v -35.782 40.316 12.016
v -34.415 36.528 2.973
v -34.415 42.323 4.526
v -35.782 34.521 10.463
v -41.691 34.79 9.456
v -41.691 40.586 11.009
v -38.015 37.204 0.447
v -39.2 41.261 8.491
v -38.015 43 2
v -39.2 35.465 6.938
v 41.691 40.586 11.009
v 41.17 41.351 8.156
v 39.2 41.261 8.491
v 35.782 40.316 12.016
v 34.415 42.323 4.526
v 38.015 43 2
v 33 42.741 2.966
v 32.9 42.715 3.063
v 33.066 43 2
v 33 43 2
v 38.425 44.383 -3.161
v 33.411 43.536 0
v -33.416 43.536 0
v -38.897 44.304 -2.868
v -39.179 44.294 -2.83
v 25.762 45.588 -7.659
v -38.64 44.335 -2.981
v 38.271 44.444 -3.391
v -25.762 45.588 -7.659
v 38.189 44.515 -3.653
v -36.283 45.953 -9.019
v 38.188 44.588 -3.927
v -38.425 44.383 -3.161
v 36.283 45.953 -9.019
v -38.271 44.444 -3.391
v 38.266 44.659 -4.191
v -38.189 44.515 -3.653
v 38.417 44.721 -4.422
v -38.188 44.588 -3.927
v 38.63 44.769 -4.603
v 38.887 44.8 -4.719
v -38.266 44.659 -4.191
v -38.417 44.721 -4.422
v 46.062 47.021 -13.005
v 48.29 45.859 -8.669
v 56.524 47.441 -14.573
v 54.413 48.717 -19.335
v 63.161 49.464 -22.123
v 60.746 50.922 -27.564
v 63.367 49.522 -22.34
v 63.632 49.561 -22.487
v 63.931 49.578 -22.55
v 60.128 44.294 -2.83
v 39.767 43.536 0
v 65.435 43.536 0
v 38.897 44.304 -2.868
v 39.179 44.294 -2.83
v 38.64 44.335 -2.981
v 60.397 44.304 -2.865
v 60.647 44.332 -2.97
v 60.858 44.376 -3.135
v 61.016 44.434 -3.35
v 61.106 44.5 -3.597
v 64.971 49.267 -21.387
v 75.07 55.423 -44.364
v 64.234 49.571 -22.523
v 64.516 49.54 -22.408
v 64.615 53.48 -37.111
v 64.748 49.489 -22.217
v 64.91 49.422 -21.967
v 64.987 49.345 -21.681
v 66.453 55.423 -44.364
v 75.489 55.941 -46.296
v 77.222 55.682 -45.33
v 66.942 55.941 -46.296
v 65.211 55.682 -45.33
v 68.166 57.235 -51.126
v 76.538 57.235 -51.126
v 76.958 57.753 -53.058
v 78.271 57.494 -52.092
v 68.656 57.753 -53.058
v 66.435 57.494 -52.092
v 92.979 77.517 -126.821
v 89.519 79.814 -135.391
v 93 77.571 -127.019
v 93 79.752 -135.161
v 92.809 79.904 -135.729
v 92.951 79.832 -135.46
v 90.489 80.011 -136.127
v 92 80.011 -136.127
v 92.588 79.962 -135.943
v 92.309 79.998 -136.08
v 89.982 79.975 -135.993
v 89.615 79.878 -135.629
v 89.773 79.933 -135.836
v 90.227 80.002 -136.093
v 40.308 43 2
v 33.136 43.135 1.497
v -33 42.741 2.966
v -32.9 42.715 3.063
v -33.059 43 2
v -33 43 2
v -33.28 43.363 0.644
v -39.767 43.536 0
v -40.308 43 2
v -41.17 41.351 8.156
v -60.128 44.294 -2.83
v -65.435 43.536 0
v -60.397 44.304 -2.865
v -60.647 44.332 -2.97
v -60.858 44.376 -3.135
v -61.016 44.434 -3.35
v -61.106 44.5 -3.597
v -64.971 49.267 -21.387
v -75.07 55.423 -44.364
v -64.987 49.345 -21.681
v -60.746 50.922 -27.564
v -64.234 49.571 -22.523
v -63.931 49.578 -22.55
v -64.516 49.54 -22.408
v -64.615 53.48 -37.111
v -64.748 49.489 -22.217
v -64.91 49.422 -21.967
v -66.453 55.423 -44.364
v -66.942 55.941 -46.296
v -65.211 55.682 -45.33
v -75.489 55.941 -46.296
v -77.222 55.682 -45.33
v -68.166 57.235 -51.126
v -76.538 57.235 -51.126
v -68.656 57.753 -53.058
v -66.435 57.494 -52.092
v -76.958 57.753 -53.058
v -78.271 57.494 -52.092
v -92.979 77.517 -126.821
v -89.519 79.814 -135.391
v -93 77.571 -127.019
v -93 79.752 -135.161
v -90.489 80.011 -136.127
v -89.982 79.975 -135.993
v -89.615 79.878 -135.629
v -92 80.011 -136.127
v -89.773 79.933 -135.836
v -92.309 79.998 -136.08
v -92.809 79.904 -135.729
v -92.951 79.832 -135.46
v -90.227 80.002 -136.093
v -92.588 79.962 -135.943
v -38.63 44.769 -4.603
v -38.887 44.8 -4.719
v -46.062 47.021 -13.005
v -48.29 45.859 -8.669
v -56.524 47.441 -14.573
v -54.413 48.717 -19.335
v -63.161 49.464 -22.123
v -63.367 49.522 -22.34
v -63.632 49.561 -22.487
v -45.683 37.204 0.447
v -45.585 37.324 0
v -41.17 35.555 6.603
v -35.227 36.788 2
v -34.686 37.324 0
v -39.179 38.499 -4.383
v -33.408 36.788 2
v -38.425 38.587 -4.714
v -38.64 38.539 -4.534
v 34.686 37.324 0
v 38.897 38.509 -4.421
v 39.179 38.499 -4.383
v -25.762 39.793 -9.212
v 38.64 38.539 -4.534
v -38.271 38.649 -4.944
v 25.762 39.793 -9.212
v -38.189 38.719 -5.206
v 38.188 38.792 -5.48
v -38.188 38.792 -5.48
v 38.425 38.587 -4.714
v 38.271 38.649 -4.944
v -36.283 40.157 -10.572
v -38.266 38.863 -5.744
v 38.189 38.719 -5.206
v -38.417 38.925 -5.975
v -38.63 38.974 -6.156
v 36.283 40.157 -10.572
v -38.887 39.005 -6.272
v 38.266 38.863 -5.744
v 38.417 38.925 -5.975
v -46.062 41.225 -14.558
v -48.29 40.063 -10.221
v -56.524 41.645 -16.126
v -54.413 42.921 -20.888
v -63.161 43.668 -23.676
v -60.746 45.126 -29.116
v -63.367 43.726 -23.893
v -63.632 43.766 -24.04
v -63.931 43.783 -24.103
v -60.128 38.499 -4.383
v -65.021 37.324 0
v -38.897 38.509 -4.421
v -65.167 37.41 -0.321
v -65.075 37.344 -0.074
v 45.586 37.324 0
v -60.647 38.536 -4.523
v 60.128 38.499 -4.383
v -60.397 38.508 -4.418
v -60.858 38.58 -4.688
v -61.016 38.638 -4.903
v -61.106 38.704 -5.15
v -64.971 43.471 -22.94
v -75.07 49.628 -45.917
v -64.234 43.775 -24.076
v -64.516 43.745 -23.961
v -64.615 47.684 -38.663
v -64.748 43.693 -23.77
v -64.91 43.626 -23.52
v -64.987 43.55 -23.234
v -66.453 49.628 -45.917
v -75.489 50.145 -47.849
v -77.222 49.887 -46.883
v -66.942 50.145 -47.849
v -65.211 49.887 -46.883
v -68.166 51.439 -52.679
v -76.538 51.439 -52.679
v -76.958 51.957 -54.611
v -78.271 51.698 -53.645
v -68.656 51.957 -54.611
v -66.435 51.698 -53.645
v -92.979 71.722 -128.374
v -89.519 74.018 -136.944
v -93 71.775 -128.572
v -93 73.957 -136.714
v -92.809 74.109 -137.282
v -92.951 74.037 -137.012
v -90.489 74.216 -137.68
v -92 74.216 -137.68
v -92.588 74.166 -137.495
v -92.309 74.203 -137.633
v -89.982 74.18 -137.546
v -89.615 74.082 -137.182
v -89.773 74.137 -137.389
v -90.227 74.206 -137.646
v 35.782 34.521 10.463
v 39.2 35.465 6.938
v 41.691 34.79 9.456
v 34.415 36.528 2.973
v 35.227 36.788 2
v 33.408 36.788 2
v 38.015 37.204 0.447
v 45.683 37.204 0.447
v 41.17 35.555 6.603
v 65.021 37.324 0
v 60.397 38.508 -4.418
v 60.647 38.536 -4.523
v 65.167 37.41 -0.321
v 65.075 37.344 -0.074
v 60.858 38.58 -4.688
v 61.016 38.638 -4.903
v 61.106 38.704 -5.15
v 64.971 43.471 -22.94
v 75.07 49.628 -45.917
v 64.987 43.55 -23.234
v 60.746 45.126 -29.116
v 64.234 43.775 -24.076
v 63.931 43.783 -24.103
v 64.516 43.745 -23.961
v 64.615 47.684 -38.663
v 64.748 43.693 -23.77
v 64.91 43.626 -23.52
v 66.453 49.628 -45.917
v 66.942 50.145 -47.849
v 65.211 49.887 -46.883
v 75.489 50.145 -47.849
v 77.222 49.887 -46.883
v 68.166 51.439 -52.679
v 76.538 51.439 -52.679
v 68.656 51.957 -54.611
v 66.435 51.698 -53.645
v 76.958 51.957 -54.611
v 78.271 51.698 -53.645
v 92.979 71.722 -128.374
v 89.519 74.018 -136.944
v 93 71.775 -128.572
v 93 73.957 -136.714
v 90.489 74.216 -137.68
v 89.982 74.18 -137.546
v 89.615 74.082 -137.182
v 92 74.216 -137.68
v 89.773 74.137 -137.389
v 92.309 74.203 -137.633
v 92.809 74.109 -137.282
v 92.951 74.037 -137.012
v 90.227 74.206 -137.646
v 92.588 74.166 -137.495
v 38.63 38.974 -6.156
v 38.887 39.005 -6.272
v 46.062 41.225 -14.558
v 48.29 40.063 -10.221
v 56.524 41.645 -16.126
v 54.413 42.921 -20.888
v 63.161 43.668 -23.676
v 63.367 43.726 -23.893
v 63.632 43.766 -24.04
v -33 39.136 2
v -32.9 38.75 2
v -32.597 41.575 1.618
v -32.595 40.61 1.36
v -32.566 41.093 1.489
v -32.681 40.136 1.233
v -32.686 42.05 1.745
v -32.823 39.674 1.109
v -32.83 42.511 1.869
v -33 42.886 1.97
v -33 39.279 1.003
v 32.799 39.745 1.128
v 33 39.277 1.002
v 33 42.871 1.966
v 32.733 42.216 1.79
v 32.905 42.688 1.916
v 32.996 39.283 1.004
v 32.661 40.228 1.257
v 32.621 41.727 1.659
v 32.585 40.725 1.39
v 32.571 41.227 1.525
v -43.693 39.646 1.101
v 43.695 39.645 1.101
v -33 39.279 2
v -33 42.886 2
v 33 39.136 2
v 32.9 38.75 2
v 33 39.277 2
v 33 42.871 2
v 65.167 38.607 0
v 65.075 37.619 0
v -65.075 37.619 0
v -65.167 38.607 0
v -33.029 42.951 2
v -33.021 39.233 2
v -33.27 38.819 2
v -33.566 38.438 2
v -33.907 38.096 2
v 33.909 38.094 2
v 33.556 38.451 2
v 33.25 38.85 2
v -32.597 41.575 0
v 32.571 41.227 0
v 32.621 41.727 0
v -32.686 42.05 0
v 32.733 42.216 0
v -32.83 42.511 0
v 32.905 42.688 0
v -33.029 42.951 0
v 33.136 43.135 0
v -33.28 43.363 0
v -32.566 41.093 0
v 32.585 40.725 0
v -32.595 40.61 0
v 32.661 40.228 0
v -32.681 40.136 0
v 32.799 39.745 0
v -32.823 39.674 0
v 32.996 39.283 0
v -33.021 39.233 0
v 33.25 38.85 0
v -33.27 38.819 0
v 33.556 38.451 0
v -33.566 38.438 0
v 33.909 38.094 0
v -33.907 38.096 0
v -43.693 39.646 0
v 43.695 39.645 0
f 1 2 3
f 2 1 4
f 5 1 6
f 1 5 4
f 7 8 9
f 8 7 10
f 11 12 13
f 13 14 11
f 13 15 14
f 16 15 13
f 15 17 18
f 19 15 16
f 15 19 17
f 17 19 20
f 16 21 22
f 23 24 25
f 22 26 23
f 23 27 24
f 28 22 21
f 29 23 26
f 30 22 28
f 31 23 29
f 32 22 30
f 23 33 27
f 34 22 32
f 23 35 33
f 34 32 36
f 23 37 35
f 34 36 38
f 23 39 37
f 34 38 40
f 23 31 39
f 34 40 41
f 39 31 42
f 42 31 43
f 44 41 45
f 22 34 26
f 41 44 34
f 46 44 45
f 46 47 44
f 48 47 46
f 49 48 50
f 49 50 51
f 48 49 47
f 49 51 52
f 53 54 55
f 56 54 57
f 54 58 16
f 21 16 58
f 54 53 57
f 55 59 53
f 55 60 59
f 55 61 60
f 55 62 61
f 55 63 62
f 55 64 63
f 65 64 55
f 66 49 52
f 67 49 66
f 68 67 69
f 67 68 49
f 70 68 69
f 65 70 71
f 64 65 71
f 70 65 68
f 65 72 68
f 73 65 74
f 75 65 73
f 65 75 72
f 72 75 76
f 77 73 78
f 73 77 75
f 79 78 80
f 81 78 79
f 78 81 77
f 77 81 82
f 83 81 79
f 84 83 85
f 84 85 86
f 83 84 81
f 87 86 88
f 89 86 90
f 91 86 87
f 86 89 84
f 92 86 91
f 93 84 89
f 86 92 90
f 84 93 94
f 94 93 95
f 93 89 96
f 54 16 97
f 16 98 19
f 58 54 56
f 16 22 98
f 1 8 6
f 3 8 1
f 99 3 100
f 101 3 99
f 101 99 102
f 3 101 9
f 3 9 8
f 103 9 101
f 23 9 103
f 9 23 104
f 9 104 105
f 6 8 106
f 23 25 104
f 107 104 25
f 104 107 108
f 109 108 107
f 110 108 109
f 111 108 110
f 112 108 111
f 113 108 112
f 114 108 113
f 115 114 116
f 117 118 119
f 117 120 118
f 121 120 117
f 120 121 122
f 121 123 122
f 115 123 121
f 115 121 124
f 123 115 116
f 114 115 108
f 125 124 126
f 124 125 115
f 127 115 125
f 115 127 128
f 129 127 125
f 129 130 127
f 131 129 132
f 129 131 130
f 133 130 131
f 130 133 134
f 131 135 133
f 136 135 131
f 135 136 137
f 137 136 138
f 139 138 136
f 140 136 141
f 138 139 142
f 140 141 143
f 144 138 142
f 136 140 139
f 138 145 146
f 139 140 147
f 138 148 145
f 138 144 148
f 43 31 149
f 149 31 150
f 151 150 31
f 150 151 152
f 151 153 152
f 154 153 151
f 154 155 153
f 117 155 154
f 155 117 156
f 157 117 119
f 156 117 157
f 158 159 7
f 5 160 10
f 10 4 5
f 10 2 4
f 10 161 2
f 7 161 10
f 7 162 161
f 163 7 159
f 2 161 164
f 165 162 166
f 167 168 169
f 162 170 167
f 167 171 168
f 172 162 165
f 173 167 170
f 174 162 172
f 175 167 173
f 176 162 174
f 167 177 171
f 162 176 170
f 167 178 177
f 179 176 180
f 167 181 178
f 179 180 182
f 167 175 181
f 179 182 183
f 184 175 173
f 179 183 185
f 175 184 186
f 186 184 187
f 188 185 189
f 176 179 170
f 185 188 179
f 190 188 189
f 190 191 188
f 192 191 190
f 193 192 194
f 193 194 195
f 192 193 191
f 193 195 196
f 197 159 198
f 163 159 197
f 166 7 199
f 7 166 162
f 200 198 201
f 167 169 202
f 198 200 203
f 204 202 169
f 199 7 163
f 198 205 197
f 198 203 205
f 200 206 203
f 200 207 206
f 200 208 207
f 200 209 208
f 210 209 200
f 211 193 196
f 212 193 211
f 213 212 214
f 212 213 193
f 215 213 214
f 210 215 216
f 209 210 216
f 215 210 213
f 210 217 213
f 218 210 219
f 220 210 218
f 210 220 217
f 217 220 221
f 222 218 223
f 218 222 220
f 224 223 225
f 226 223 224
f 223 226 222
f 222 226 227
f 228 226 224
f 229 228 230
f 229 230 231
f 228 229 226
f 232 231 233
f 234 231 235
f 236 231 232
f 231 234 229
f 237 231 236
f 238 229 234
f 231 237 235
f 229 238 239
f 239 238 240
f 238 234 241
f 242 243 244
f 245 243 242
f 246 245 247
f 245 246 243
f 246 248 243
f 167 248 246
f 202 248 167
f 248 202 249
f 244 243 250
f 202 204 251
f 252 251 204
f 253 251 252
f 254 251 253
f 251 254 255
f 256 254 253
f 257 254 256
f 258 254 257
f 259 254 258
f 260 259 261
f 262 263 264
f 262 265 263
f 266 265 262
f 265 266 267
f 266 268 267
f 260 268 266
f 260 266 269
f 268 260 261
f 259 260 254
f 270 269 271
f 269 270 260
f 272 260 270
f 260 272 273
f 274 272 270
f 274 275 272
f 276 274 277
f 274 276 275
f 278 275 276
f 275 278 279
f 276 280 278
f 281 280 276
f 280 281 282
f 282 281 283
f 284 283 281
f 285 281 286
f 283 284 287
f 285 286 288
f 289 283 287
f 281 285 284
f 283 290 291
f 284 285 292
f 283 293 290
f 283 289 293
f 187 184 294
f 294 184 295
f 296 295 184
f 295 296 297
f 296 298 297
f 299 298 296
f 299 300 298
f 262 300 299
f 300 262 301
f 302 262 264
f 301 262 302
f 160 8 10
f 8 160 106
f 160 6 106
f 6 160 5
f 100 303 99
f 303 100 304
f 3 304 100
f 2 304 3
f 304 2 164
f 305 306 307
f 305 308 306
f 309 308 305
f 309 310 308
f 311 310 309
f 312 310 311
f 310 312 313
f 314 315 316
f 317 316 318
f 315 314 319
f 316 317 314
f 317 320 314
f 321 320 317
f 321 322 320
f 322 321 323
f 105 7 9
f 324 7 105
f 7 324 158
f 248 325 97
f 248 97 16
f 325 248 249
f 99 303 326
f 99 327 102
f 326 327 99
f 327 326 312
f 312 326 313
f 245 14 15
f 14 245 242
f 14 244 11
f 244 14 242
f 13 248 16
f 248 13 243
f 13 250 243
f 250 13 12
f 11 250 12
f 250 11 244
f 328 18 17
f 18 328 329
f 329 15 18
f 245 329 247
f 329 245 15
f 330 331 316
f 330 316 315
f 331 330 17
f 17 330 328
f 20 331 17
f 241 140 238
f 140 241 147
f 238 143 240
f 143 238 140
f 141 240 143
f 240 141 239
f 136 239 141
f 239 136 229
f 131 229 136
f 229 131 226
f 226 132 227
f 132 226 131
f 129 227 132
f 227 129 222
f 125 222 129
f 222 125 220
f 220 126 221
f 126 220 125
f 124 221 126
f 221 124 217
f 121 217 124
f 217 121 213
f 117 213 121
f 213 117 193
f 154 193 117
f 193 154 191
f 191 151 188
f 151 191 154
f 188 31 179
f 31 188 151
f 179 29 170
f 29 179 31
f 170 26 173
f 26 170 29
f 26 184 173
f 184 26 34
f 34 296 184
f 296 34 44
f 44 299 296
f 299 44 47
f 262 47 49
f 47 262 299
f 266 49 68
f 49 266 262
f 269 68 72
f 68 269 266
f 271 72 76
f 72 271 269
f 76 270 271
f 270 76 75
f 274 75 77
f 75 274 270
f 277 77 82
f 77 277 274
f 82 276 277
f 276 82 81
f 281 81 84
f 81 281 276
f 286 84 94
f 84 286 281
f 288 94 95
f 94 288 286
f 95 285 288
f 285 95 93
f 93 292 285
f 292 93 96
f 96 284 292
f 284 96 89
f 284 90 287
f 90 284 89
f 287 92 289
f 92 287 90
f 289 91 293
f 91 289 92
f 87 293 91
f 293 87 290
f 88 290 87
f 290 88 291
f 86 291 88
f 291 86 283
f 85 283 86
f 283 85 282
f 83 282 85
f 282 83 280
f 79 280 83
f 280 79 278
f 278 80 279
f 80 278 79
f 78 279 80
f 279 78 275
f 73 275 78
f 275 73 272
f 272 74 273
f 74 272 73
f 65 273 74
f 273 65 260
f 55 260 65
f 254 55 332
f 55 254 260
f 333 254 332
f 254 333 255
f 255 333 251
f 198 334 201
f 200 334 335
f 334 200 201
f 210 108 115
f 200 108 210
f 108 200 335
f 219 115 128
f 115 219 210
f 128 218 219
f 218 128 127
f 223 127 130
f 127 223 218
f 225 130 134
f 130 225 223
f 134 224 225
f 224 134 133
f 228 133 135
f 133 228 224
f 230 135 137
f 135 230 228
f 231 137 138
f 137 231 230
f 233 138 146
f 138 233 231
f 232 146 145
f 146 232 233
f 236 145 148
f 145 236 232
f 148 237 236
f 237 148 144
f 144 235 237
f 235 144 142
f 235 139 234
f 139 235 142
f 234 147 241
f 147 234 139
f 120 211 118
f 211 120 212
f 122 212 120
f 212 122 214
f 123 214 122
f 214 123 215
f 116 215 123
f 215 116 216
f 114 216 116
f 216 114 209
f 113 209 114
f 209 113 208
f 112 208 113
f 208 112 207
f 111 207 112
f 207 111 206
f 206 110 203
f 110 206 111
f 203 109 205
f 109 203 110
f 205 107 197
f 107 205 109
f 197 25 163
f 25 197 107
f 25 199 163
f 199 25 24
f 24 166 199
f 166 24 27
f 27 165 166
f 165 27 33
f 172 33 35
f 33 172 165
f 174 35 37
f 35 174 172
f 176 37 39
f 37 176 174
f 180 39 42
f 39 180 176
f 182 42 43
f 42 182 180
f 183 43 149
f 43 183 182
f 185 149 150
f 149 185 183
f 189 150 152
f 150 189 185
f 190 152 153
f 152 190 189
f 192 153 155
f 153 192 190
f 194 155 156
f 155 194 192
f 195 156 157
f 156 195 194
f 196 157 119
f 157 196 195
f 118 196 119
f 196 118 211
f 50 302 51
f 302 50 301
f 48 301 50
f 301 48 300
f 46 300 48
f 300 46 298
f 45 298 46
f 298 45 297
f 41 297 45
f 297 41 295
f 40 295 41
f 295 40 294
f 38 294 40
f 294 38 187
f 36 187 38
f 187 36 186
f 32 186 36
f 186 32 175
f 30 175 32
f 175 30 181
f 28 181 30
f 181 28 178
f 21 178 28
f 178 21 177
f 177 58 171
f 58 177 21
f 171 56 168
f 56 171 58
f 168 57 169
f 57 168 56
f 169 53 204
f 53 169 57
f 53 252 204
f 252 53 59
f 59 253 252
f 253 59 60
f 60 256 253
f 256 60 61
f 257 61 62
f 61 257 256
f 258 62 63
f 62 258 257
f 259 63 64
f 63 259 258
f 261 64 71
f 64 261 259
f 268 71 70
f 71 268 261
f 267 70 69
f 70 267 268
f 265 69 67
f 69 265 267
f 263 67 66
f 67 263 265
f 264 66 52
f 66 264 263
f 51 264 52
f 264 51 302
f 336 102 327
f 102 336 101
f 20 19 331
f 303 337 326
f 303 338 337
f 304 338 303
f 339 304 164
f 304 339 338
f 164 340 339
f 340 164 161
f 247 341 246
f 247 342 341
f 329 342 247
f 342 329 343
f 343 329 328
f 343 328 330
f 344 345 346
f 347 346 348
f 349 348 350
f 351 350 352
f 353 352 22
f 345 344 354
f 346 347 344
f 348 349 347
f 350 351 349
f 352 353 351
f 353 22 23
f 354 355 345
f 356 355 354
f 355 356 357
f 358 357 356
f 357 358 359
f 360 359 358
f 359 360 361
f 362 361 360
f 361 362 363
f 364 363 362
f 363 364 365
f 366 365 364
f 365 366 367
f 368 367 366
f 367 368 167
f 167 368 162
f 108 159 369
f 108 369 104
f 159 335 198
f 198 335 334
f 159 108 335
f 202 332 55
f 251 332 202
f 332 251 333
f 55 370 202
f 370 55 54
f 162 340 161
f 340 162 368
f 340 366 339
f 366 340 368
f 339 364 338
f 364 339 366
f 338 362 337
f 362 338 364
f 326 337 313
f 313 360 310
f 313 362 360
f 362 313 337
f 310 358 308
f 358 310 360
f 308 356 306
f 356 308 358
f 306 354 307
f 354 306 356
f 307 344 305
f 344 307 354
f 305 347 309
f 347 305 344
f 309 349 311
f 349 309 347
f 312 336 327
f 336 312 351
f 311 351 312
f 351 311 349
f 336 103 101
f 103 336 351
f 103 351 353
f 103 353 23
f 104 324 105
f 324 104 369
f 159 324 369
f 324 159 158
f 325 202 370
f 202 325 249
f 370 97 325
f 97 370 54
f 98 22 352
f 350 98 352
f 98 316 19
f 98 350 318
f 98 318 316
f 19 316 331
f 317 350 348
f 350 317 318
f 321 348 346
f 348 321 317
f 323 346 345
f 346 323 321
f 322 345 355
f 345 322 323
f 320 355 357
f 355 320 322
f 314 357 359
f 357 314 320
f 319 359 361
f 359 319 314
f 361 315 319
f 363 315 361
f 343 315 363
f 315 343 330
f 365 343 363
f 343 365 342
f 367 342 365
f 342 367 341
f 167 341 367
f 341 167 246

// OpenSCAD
//include<gimbal-mount.scad>

module holes(){
	linear_extrude(height=2){
		import("bottom-plate.dxf", $fn=50);
	}
}

module base_plate(){
	difference(){
		cylinder(r=80, h=2);
		holes();
	}
}

module gear(file="gear.dxf"){
	difference(){
		translate([0,43,2]){
			rotate([15,0,0]){
				translate([0,-3,0]){
					nose_gear();
					rotate([0,0,180])
						nose_gear();
				}		
				translate([0,0,-88]){
					rotate([90,0,0])
						linear_extrude(height=6){
							import(file, $fn=20);
						}
				}
			}
		}	
		base_plate();
	}
}

module nose_2(l1,l2,h1,h2,t){   
        rotate([90,0,0])
                translate([0,0,t/-2])
                        linear_extrude(height=t)
                                polygon(points=[[0,0],[l1,0],[l1,h1],[l1+l2,h1+l2],[l1+l2-(h2-h1-l2),h2],[0,h2]], paths=[[0,1,2,3,4,5]]);
					

}

module nose_gear(){
	translate([-37,0,0]){
		nose_2(4,0.1,1,4,6);
		rotate([0,-10,0]){
			translate([-1,-3,0])
				cube([4,6,10]);			
			translate([-3,-3,7])
				cube([6,6,3]);
		}
	}
}

module both_gears(){
	gear();
	rotate([0,0,180])
		gear();
}

module schnitt(){
projection()
	rotate([0,90,0]){
		base_plate();
		both_gears();
	}
}



module gear_bottom(){
	difference(){
		translate([0,0,-143+2])
			linear_extrude(height=2){
				import("gear_bottom.dxf", $fn=50);
			}
			//cube([190,140,2]);
		both_gears();
	}
}

module spikel(){
	translate([38,1,1.2])
		rotate([-13.5,0,15])
			rotate([90,-90,0])
				translate([0,-15,30])
					linear_extrude(height=70)
						polygon([[10,0],[0,15],[-10,0]]);
				
}

module gear_stabilizer(){
	difference(){
		translate([57,0,1.5])		
			rotate([90,0,90])
				difference(){
					linear_extrude(height=50){
						//rotate([13.8,0,0])
						import("gear_stabilizer.dxf");
					}
					rotate([-11.8,0,0])
						translate([-100,-100,11])
							cube([200,80,70]);
					rotate([-14.8,0,0])
						translate([-100,-100,-76])
							cube([200,80,70]);
					spikel();
					mirror([1,0,0])
						spikel();
		}
		minkowski(){
			both_gears();
			sphere(r=0.7);
		}
	}
}

//base_plate();
//both_gears();

//gear_stabilizer();

gear("gear_front.dxf");
//gear_bottom();
